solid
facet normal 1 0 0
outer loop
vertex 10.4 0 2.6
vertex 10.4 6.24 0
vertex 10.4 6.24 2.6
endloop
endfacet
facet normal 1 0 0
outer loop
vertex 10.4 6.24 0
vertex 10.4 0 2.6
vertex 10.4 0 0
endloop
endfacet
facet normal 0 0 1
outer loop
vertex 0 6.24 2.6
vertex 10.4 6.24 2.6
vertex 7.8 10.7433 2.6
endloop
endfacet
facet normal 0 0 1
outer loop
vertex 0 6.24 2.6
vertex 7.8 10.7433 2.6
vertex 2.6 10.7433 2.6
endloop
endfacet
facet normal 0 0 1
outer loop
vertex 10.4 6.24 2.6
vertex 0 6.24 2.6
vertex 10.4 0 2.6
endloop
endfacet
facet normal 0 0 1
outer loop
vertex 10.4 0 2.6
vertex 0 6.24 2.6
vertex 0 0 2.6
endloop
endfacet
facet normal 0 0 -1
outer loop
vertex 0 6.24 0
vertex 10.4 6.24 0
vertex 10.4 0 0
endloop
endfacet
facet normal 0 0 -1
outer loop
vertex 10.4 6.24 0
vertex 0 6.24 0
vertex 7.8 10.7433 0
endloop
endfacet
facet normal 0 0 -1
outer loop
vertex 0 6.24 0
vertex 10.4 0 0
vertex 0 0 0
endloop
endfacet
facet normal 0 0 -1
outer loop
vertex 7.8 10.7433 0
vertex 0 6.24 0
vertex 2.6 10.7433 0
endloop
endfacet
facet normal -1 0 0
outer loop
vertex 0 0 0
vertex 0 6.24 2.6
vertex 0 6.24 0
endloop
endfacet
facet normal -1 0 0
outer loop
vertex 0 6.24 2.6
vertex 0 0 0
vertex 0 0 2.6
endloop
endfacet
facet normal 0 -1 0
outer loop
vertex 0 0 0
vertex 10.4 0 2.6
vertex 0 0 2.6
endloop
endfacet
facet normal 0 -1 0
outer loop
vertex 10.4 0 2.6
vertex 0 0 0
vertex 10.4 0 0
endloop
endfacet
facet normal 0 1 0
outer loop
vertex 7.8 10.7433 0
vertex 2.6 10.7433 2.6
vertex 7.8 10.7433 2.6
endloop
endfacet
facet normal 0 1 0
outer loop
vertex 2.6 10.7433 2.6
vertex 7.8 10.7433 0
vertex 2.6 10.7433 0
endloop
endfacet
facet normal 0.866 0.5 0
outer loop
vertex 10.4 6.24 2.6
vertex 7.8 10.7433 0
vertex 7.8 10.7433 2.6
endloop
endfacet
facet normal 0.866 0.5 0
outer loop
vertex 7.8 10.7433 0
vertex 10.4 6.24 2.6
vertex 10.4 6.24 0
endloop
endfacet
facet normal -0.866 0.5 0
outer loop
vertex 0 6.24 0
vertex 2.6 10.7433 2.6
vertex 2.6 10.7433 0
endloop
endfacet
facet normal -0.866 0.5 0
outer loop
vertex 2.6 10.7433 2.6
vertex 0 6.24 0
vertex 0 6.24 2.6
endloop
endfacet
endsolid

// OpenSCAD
$fn = 150;

union() {
	cube(size = [10.4, 6.24, 2.6]);
	translate(v = [0, 6.24, 0]) {
		translate(v = [5.2, 0, 0]) {
			cylinder($fn = 6, d = 10.4, h = 2.6);
		}
	}
}
